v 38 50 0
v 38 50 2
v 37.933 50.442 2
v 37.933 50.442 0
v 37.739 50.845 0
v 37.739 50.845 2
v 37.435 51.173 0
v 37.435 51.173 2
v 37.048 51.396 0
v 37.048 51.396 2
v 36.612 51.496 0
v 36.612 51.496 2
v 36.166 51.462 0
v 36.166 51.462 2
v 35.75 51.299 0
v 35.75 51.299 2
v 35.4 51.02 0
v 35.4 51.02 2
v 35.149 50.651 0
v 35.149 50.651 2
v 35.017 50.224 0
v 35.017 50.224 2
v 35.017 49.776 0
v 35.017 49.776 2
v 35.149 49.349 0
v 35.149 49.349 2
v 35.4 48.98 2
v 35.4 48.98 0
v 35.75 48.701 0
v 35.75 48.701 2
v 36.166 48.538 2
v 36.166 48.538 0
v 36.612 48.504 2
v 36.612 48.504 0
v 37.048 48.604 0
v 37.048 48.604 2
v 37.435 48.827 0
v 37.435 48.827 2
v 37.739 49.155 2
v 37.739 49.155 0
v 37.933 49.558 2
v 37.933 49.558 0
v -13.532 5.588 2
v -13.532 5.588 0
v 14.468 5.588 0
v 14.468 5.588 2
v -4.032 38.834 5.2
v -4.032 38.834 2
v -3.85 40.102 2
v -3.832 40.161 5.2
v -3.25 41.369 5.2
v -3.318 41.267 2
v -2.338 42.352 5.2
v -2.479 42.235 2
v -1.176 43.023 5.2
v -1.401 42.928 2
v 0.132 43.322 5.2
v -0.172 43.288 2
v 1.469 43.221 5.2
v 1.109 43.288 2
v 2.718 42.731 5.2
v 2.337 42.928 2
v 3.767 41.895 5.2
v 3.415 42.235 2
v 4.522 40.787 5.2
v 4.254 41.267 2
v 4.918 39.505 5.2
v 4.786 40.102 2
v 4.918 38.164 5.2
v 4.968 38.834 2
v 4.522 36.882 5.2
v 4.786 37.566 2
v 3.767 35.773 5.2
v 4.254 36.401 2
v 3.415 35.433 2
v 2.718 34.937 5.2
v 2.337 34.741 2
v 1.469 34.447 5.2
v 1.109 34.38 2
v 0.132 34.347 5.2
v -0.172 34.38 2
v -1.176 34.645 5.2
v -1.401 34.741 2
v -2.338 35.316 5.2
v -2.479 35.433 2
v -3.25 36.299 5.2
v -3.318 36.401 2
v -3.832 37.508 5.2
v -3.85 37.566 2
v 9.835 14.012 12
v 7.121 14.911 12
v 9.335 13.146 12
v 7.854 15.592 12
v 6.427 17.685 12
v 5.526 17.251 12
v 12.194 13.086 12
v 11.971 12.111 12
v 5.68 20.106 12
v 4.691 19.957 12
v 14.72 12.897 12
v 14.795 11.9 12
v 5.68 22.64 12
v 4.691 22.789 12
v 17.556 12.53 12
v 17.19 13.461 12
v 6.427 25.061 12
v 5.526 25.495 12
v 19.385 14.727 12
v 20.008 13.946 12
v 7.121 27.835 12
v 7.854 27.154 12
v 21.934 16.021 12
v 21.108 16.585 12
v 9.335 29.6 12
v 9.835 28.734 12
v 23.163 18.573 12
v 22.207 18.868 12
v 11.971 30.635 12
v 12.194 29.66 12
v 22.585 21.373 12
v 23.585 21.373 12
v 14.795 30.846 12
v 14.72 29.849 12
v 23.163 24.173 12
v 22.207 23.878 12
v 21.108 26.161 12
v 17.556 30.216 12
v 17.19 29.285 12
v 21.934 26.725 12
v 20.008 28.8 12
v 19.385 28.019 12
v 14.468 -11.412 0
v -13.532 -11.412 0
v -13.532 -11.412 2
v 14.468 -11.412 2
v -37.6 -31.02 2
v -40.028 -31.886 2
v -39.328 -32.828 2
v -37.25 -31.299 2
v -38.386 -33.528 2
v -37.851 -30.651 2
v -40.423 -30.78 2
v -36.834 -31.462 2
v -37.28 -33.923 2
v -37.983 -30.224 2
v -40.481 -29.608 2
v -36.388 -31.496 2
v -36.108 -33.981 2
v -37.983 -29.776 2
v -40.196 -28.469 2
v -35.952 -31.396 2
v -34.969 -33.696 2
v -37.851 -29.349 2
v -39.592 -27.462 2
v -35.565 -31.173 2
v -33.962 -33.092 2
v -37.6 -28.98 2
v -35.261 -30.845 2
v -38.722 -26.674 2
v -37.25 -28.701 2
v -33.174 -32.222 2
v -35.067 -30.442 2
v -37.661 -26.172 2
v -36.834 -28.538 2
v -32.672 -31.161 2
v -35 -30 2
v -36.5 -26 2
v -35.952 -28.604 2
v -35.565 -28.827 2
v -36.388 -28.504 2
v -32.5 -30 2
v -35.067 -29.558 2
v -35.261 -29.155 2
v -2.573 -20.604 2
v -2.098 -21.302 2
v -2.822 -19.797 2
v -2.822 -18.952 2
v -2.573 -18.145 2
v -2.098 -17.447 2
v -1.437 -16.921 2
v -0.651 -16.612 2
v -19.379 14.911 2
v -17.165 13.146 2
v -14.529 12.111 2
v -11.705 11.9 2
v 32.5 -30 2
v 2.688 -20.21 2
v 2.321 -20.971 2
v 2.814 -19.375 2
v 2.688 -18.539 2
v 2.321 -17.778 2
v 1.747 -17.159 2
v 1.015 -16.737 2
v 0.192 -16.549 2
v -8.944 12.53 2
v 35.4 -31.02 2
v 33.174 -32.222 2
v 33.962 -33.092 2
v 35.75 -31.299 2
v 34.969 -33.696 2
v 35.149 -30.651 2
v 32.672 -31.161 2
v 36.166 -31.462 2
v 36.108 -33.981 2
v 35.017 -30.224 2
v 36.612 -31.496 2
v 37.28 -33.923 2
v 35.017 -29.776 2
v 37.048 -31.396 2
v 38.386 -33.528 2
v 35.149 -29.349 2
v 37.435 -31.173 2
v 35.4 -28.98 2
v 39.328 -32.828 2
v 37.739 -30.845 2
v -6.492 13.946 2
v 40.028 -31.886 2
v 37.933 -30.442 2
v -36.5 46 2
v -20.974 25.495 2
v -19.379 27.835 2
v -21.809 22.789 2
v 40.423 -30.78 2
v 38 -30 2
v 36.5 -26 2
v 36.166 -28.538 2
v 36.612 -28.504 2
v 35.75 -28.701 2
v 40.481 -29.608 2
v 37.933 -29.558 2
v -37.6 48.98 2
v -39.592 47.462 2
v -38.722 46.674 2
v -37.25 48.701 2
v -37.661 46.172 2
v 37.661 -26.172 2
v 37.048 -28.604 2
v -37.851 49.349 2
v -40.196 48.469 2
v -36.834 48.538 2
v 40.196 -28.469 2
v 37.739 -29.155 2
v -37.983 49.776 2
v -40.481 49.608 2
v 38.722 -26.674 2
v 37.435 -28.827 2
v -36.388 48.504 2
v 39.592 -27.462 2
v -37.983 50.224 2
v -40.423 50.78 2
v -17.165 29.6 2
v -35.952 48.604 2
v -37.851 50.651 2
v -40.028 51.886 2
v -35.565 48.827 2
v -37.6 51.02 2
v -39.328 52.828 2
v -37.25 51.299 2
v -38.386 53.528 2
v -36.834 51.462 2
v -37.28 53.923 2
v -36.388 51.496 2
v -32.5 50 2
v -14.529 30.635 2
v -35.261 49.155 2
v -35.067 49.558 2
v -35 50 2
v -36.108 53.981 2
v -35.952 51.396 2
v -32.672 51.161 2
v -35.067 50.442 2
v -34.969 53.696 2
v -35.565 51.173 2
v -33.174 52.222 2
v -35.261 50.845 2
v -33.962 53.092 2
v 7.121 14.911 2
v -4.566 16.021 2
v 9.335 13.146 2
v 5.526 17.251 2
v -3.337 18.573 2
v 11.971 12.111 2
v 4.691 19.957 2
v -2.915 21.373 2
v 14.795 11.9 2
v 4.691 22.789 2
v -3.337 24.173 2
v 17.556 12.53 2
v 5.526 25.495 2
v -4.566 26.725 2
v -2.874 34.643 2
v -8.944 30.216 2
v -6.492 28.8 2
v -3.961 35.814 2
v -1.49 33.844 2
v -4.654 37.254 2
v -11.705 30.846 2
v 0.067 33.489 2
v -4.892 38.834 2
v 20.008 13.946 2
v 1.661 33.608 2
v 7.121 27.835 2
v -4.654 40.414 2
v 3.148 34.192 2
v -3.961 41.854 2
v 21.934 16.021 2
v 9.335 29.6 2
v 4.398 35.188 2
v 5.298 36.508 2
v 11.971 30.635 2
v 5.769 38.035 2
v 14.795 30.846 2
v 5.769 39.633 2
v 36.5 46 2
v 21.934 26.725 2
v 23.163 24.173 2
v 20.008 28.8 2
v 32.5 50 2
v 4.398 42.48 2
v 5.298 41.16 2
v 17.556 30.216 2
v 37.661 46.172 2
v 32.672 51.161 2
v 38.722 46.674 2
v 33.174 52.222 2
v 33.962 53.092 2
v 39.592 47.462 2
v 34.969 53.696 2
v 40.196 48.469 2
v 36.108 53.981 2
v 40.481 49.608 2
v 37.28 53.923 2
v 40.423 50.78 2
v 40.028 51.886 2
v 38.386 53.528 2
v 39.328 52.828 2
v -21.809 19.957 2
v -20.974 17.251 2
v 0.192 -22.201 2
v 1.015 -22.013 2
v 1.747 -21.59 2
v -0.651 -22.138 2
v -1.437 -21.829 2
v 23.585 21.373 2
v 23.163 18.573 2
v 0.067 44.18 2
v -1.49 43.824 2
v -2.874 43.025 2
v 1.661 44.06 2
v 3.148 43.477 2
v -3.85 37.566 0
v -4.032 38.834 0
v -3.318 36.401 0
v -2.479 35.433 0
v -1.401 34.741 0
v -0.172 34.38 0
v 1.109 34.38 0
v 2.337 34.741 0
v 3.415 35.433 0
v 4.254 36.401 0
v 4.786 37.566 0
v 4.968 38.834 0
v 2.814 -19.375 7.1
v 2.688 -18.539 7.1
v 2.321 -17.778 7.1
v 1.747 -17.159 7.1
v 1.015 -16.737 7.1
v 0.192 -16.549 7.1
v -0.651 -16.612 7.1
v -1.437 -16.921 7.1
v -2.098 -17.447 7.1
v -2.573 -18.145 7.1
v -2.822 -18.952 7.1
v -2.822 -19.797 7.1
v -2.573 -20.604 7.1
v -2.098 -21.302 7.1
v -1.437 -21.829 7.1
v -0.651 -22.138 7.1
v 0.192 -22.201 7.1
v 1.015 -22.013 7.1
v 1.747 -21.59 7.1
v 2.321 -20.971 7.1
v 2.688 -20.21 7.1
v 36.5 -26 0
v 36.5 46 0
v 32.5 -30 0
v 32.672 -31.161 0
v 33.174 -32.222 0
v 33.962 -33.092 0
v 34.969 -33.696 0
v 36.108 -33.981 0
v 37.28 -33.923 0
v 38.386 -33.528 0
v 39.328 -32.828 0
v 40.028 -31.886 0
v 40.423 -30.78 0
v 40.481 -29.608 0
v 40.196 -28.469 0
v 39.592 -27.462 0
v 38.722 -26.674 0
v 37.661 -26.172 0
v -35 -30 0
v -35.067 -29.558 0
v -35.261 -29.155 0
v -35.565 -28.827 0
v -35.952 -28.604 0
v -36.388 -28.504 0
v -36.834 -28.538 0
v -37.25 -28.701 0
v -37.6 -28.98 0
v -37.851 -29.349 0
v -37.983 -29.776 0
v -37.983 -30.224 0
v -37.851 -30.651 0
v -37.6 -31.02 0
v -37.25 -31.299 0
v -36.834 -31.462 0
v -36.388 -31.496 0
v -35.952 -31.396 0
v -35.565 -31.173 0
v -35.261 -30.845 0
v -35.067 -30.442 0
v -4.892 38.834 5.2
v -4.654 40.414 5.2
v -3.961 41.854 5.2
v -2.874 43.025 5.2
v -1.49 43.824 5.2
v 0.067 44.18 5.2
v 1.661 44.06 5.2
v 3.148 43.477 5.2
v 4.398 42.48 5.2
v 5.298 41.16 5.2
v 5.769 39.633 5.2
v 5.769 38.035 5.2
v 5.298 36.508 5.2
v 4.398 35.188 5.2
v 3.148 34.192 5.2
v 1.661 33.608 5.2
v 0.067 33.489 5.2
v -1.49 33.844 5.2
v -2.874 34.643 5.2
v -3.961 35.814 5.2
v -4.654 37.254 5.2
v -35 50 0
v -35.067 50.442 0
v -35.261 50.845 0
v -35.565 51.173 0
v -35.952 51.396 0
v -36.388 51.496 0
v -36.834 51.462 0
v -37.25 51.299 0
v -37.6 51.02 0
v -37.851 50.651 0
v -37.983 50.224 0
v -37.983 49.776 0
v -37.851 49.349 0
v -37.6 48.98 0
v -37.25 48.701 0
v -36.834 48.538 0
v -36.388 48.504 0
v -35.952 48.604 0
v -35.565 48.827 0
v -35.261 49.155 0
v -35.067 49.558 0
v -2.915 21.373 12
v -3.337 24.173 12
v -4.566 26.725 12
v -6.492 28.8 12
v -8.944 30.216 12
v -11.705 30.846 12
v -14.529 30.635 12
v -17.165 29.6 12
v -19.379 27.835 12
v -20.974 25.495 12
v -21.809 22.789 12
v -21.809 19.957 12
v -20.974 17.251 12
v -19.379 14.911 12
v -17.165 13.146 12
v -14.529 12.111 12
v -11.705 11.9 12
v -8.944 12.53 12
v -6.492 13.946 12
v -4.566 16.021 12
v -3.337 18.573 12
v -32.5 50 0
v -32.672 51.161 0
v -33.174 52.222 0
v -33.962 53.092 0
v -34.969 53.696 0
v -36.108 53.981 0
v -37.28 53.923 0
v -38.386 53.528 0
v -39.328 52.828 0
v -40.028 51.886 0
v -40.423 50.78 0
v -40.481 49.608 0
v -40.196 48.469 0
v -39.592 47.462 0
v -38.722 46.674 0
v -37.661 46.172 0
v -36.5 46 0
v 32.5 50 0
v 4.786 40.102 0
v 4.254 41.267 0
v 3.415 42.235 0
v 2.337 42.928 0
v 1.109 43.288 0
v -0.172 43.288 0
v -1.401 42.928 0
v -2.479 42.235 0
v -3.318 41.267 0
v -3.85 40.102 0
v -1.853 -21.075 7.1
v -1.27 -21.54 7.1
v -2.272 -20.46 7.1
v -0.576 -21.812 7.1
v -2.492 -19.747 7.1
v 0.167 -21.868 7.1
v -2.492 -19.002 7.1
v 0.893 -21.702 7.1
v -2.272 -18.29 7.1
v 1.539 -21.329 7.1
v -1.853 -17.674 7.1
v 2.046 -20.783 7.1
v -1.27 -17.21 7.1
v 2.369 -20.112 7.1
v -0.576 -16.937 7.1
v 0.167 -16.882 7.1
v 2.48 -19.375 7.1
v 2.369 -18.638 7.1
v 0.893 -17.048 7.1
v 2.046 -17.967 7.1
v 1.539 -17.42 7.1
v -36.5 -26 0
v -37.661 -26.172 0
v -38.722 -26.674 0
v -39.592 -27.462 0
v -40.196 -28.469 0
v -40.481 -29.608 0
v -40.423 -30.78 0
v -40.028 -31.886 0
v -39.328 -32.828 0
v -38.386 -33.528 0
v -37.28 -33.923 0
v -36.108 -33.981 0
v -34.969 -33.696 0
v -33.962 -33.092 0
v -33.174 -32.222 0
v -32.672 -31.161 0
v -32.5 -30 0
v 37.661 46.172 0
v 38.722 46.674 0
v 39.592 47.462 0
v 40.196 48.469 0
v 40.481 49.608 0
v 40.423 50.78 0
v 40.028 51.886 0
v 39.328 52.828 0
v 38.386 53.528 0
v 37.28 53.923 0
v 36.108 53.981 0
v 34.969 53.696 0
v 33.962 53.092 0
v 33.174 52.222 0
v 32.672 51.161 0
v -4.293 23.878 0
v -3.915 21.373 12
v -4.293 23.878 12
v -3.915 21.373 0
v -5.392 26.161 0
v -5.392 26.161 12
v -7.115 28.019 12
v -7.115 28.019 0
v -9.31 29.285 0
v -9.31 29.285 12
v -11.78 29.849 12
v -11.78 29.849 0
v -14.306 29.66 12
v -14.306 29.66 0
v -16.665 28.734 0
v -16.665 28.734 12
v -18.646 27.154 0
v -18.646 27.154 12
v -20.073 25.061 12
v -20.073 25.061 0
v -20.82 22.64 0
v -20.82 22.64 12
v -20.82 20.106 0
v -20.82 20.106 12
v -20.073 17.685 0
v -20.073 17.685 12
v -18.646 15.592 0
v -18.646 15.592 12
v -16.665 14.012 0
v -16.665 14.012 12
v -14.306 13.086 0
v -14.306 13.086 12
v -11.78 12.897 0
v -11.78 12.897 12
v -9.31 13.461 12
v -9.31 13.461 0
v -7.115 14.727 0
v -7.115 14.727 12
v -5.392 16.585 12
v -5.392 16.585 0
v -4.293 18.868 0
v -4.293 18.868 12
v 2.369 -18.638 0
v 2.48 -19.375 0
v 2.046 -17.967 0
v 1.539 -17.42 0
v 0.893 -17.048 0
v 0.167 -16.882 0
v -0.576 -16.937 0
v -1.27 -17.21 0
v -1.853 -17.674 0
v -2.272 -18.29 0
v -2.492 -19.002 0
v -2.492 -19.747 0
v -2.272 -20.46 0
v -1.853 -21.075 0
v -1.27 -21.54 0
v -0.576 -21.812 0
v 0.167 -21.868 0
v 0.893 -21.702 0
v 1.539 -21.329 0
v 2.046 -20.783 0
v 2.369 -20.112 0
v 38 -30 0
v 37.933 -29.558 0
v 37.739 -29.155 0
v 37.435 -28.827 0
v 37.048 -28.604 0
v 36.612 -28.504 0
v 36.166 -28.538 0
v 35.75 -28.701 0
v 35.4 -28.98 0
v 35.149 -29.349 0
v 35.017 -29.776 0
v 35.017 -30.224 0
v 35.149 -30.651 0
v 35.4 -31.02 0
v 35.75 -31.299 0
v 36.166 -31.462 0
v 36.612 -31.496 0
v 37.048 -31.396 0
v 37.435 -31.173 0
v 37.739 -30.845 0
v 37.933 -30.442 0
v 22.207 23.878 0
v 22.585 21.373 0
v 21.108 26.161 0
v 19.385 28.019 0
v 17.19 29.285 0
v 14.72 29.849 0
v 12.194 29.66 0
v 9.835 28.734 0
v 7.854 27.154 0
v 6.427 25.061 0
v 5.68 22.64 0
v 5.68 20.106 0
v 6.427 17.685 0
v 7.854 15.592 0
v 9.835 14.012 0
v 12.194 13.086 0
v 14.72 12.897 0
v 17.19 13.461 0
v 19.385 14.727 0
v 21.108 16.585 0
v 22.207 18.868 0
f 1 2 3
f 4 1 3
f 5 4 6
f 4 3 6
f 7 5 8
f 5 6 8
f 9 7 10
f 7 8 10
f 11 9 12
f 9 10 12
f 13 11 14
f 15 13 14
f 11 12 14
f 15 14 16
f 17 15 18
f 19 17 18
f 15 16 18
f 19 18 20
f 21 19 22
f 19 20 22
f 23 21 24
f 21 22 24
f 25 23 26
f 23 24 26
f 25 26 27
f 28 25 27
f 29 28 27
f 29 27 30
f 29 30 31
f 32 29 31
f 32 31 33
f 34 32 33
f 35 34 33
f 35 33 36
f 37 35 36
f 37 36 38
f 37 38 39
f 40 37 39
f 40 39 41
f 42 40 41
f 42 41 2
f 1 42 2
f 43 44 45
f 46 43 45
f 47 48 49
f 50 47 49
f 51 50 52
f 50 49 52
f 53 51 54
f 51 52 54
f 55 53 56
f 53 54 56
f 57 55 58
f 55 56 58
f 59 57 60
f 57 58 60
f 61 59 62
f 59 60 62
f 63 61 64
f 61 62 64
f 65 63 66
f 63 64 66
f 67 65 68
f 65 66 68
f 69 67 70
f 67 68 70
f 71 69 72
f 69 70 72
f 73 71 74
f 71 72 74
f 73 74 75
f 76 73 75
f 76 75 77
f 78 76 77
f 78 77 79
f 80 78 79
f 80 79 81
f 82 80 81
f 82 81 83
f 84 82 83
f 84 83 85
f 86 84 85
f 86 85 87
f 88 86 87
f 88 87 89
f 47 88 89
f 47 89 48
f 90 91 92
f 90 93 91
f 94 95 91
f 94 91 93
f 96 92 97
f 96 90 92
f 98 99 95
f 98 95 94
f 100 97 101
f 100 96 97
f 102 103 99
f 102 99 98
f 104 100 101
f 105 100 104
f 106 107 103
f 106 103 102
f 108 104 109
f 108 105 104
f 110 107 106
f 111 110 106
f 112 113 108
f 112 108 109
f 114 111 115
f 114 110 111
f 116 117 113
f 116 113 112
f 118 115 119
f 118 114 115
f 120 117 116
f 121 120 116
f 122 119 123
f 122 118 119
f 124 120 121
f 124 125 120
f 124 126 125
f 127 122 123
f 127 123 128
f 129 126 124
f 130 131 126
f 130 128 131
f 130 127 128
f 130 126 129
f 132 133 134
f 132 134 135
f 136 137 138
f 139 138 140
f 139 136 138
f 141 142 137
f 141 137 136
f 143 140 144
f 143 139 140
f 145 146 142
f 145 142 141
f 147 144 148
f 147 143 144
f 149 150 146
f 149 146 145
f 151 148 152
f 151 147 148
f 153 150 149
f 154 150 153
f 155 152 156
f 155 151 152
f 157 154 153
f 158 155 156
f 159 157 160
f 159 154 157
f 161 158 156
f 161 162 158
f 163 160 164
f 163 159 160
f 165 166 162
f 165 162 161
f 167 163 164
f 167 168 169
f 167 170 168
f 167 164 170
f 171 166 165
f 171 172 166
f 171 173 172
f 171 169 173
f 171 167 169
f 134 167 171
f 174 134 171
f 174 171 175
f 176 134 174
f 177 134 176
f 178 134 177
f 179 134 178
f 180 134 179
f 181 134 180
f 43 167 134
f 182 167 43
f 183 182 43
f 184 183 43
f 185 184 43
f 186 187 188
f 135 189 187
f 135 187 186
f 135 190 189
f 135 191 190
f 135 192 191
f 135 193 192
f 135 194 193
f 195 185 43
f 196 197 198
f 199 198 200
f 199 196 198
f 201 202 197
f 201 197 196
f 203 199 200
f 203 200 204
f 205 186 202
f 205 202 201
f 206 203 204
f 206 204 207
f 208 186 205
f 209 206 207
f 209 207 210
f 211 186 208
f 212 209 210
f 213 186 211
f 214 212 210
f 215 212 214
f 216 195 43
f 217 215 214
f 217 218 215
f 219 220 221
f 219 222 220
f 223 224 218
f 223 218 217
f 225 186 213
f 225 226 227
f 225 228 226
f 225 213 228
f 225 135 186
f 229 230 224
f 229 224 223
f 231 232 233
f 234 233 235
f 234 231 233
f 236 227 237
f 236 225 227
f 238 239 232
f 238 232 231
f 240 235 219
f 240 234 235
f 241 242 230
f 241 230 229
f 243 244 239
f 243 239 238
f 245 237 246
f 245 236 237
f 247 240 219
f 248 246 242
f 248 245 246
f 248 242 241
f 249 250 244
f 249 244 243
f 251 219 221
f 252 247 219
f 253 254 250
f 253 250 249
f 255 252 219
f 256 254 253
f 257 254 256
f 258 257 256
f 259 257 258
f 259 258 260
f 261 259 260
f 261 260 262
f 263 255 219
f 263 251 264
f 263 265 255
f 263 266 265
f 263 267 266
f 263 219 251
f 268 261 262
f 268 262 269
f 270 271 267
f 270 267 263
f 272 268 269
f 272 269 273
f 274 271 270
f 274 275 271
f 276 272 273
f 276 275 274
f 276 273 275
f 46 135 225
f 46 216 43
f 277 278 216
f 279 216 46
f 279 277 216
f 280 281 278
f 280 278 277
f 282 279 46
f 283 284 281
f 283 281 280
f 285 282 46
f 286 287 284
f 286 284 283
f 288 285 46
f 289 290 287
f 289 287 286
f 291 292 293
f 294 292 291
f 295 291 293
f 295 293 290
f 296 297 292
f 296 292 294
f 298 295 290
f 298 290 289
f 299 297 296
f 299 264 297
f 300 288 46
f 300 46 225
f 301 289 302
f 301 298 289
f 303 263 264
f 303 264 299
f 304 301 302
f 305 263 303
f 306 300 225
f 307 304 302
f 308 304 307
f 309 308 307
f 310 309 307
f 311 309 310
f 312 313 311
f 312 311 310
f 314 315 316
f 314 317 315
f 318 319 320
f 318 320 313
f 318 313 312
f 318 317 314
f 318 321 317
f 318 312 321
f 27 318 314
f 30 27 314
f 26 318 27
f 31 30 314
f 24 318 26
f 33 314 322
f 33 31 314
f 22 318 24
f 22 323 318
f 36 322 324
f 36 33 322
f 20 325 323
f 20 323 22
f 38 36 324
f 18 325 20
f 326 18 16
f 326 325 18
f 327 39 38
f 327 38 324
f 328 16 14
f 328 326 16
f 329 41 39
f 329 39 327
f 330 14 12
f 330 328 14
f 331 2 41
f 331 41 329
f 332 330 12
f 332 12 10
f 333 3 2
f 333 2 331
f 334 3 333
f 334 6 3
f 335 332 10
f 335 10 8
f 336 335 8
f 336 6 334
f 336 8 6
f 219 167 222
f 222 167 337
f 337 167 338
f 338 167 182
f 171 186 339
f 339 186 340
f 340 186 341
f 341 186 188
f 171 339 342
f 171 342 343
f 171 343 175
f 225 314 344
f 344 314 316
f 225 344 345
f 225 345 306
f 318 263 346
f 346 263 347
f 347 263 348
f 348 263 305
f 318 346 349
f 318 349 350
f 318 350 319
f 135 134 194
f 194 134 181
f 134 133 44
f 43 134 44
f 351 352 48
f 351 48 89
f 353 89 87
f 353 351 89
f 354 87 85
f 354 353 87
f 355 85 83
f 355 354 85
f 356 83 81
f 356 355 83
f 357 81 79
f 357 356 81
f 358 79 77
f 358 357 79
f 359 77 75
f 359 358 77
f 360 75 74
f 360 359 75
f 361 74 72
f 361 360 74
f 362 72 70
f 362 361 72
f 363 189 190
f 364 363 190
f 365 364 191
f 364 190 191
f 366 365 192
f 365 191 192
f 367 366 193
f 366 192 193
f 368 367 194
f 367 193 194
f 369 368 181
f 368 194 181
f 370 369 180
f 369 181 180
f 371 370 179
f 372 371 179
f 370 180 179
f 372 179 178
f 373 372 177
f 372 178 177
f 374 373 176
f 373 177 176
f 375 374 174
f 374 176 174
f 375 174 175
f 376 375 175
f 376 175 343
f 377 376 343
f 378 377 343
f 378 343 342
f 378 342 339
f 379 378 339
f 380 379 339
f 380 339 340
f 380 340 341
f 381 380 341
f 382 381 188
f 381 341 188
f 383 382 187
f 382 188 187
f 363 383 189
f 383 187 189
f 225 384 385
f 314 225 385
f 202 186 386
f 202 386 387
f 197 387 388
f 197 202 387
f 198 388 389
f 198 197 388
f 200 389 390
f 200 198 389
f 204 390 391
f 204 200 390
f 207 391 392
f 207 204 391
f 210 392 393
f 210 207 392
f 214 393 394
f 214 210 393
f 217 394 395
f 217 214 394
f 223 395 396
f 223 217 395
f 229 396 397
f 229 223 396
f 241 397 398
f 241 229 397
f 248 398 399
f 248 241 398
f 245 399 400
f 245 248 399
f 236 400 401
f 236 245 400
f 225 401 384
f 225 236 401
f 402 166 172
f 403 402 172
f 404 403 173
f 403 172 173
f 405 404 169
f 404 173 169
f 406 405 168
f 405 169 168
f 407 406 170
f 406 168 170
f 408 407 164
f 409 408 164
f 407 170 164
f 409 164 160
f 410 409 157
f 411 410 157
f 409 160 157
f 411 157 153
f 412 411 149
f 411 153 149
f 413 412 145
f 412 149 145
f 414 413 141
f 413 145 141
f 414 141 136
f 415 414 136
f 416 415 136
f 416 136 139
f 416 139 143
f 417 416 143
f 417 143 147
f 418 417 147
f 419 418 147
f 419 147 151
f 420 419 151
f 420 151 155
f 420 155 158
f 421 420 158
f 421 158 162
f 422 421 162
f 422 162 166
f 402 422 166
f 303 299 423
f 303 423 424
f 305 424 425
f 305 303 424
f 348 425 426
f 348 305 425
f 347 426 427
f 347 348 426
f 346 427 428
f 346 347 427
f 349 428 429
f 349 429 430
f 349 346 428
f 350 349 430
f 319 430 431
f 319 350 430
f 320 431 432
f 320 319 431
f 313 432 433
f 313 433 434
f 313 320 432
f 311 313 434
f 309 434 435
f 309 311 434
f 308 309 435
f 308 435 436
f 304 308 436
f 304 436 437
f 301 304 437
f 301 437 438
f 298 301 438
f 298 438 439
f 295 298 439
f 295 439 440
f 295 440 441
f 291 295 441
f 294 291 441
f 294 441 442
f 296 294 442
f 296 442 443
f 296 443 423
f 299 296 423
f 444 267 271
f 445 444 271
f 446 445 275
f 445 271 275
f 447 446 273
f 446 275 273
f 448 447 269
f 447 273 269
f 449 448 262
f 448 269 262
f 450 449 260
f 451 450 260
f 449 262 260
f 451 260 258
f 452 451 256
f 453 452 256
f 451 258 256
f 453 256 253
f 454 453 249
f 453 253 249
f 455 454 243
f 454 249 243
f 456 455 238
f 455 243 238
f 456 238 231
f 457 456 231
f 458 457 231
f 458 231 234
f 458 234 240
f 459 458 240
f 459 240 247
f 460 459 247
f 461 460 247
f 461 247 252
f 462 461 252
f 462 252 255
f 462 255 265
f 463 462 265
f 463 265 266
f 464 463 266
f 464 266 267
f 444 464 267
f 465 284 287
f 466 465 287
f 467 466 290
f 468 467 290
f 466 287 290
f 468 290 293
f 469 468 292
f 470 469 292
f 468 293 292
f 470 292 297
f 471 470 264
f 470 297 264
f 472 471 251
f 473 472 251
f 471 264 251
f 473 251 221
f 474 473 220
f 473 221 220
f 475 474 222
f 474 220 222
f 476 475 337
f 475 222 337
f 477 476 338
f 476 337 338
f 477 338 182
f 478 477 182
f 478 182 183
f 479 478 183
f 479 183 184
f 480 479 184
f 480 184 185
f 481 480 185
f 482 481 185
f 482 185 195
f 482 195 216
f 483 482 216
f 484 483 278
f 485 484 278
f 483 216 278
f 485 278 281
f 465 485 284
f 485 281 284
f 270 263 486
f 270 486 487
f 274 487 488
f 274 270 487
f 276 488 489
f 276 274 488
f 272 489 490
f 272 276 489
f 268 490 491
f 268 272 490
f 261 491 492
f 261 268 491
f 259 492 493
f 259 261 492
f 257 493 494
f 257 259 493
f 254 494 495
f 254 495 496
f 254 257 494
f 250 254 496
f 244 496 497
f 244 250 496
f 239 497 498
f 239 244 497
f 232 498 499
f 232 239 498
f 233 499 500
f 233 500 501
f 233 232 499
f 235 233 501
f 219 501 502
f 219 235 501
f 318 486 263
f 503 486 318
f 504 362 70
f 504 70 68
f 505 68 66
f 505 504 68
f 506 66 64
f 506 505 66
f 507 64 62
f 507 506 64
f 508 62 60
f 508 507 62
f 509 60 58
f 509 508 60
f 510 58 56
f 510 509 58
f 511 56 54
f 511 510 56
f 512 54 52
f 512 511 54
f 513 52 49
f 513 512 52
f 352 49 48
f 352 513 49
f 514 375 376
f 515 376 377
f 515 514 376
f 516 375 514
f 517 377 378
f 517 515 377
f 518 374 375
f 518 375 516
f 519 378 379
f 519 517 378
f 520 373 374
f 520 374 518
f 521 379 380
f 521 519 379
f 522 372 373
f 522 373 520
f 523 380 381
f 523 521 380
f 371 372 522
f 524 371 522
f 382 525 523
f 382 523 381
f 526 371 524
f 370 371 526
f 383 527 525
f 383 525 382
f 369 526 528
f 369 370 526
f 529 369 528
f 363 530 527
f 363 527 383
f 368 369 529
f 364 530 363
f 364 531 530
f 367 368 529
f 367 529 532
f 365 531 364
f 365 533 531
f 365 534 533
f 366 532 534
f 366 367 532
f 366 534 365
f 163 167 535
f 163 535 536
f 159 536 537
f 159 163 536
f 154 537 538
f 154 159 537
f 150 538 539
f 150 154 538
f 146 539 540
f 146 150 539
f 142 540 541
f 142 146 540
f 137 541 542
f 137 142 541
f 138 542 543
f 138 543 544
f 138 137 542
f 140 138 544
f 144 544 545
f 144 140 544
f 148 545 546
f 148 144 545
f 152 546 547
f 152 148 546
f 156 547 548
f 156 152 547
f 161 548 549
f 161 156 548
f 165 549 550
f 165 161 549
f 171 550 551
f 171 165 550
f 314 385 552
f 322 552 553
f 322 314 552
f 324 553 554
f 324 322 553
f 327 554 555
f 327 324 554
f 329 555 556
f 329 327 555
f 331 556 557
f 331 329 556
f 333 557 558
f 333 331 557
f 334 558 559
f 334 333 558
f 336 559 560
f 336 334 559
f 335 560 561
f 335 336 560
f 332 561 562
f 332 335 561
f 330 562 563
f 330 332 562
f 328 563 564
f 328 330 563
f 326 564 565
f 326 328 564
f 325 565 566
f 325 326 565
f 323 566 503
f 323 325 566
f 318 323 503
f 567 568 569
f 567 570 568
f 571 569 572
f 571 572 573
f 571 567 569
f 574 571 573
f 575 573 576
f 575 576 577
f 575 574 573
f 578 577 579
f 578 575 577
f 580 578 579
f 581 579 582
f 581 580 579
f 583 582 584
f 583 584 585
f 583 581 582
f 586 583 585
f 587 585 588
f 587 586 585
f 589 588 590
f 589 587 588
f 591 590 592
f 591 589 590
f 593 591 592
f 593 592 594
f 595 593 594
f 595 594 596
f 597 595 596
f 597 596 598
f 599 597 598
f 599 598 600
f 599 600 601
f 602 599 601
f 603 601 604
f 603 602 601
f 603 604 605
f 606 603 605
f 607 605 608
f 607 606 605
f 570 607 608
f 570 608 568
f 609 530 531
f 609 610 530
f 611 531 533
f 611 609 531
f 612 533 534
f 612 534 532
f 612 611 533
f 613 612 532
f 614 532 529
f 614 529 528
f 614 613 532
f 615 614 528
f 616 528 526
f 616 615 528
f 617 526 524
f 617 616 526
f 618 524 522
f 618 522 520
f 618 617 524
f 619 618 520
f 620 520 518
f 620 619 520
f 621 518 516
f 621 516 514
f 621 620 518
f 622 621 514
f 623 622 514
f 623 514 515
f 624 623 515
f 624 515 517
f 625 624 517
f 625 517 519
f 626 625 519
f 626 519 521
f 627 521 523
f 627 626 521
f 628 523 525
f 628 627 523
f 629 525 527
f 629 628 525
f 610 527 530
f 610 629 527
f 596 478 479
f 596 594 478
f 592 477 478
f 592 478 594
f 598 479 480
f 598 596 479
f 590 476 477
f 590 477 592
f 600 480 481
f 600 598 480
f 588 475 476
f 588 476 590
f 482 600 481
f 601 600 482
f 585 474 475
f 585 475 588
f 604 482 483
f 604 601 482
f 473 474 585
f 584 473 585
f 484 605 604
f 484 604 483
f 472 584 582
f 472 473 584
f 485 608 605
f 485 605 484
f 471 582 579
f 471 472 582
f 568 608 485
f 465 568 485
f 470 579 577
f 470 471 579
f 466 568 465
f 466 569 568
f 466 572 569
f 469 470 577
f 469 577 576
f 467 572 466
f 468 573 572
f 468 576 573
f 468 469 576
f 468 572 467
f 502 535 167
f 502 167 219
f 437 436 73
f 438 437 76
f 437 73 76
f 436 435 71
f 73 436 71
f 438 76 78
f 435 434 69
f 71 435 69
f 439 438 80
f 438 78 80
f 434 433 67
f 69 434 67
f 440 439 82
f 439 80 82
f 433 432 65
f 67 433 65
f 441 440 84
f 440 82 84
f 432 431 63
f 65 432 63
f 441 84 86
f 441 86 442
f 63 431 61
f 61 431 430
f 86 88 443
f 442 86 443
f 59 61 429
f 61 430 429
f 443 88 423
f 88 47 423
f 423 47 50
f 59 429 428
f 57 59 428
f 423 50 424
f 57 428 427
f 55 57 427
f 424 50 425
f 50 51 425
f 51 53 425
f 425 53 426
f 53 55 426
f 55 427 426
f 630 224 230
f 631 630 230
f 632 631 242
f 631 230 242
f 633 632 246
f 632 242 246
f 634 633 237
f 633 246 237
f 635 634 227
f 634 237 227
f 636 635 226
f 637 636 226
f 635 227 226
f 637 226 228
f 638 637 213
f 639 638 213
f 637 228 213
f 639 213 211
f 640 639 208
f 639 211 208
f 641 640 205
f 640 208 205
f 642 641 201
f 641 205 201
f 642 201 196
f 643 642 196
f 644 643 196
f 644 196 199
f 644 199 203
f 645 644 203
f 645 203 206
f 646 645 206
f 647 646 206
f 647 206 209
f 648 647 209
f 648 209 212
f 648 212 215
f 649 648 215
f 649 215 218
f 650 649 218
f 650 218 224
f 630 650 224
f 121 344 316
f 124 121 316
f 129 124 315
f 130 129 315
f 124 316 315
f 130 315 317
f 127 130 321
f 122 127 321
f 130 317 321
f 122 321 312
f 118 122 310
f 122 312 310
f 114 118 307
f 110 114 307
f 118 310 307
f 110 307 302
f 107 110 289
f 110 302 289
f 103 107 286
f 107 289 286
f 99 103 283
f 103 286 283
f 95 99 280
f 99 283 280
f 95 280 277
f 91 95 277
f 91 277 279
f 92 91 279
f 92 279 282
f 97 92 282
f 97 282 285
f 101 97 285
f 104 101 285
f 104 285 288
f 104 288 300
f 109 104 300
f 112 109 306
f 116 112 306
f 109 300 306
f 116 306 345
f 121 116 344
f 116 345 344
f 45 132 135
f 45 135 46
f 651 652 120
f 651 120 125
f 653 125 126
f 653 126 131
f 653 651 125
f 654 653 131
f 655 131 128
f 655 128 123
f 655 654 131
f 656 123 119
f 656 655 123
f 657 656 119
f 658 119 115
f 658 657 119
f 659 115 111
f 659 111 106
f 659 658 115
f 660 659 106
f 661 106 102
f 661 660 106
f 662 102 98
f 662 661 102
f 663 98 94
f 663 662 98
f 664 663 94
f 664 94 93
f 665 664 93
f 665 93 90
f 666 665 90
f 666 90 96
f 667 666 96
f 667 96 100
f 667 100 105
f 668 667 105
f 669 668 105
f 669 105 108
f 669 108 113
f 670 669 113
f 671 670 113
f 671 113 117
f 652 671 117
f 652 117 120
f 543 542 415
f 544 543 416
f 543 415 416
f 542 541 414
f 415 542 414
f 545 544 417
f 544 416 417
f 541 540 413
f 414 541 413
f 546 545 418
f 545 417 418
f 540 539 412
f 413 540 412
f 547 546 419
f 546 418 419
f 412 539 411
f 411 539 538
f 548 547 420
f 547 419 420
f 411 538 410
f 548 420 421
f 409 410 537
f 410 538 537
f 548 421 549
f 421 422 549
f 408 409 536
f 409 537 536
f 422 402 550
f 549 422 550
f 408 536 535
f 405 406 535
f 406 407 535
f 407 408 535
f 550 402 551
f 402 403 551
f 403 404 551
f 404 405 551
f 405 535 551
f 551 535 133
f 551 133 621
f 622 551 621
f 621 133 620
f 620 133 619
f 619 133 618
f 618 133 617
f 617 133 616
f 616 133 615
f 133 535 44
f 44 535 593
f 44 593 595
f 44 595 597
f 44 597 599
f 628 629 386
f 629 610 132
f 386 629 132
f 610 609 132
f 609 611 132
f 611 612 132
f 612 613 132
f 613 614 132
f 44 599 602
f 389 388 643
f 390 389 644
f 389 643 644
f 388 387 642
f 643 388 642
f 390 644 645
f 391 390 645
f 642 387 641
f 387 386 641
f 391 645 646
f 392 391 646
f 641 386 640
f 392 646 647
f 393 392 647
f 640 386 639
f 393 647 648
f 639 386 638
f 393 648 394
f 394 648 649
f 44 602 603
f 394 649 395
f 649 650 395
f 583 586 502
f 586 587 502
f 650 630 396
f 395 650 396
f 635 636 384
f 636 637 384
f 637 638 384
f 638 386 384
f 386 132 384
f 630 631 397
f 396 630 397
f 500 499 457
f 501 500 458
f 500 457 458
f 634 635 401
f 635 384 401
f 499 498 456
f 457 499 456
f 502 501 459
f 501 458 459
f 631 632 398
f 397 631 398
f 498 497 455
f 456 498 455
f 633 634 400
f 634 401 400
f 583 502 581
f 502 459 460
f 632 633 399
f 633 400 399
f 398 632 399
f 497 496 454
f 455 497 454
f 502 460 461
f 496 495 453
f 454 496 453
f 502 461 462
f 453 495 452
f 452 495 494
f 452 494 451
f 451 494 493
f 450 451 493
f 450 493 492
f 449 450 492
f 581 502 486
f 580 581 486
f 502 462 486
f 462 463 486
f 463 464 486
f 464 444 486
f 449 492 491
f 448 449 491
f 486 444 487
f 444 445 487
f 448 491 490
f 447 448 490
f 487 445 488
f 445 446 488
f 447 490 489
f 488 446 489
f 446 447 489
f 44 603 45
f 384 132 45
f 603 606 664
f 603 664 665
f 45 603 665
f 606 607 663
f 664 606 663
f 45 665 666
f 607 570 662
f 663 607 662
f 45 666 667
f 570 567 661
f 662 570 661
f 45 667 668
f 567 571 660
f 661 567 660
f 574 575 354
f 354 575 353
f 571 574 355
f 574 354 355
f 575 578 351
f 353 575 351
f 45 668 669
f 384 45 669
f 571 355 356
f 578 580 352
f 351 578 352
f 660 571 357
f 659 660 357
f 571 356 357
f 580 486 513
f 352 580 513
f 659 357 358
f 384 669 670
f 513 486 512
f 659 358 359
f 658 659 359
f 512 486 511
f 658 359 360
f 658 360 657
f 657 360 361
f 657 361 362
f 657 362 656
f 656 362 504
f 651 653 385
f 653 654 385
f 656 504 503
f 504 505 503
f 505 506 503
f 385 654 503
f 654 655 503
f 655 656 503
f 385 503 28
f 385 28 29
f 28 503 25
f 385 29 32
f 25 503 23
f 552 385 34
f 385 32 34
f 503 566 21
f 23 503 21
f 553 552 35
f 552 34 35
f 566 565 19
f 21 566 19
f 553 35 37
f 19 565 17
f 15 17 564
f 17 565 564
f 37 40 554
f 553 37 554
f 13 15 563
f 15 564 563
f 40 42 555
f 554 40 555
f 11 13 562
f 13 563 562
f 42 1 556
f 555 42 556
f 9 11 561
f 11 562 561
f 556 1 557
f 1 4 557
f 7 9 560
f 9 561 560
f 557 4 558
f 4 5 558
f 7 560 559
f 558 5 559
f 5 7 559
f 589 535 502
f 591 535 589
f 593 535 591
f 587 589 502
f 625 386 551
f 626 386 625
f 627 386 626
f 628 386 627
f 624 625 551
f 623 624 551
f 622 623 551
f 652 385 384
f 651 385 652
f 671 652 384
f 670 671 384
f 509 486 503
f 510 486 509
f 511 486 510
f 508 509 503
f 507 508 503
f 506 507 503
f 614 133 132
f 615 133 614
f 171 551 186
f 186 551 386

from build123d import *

# Parameters (mm, degrees)
SKETCH1_W           = 73
SKETCH1_H           = 80
SKETCH1_R           = 8.5
SKETCH1_R_2         = 4.5
SKETCH1_R_3         = 2.5
SKETCH1_W_2         = 28
SKETCH1_H_2         = 17
BOSS_EXTRUDE3_DEPTH = 2
SKETCH2_R           = 4
BOSS_EXTRUDE4_DEPTH = 2
SKETCH3_R           = 1.5
CUT_EXTRUDE1_DEPTH  = 10
SKETCH4_R           = 9.5
SKETCH4_R_2         = 8.5
BOSS_EXTRUDE5_DEPTH = 10
SKETCH5_R           = 5.360584101
SKETCH5_R_2         = 4.5
BOSS_EXTRUDE6_DEPTH = 5.2
SKETCH7_R           = 2.833966857
SKETCH7_R_2         = 2.5
BOSS_EXTRUDE7_DEPTH = 5.1


with BuildPart() as part:
    # Sketch1 → Boss-Extrude3 (new body)
    with BuildSketch(Plane.XY):
        with Locations((0, 10)):
            Rectangle(SKETCH1_W, SKETCH1_H)
        with Locations((-12.414904508, 21.373016215)):
            Circle(SKETCH1_R, mode=Mode.SUBTRACT)
        with Locations((14.085095492, 21.373016215)):
            Circle(SKETCH1_R, mode=Mode.SUBTRACT)
        with Locations((0.468085113, 38.834207529)):
            Circle(SKETCH1_R_2, mode=Mode.SUBTRACT)
        with Locations((-0.020060086, -19.374805823)):
            Circle(SKETCH1_R_3, mode=Mode.SUBTRACT)
        with Locations((0.468085113, -2.91182709)):
            Rectangle(SKETCH1_W_2, SKETCH1_H_2, mode=Mode.SUBTRACT)
    extrude(amount=BOSS_EXTRUDE3_DEPTH)

    # Sketch2 → Boss-Extrude4 (add)
    with BuildSketch(Plane.XY.offset(2)):
        with Locations((-36.5, 50)):
            Circle(SKETCH2_R)
        with Locations((36.5, 50)):
            Circle(SKETCH2_R)
        with Locations((36.5, -30)):
            Circle(SKETCH2_R)
        with Locations((-36.5, -30)):
            Circle(SKETCH2_R)
    extrude(amount=-BOSS_EXTRUDE4_DEPTH)

    # Sketch3 → Cut-Extrude1 (cut)
    with BuildSketch(Plane.XY.offset(2)):
        with Locations((-36.5, 50)):
            Circle(SKETCH3_R)
        with Locations((36.5, 50)):
            Circle(SKETCH3_R)
        with Locations((36.5, -30)):
            Circle(SKETCH3_R)
        with Locations((-36.5, -30)):
            Circle(SKETCH3_R)
    extrude(amount=-CUT_EXTRUDE1_DEPTH, mode=Mode.SUBTRACT)

    # Sketch4 → Boss-Extrude5 (add)
    with BuildSketch(Plane.XY.offset(2)):
        with Locations((-12.414904508, 21.373016215)):
            Circle(SKETCH4_R)
        with Locations((-12.414904508, 21.373016215)):
            Circle(SKETCH4_R_2, mode=Mode.SUBTRACT)
        with Locations((14.085095492, 21.373016215)):
            Circle(SKETCH4_R)
        with Locations((14.085095492, 21.373016215)):
            Circle(SKETCH4_R_2, mode=Mode.SUBTRACT)
    extrude(amount=BOSS_EXTRUDE5_DEPTH)

    # Sketch5 → Boss-Extrude6 (add)
    with BuildSketch(Plane(origin=(0, 0, 0), x_dir=(-1, 0, 0), z_dir=(0, 0, -1))):
        with Locations((-0.468085113, 38.834207529)):
            Circle(SKETCH5_R)
        with Locations((-0.468085113, 38.834207529)):
            Circle(SKETCH5_R_2, mode=Mode.SUBTRACT)
    extrude(amount=-BOSS_EXTRUDE6_DEPTH)

    # Sketch7 → Boss-Extrude7 (add)
    with BuildSketch(Plane.XY.offset(2)):
        with Locations((-0.020060086, -19.374805823)):
            Circle(SKETCH7_R)
        with Locations((-0.020060086, -19.374805823)):
            Circle(SKETCH7_R_2, mode=Mode.SUBTRACT)
    extrude(amount=BOSS_EXTRUDE7_DEPTH)


solid = part.part
